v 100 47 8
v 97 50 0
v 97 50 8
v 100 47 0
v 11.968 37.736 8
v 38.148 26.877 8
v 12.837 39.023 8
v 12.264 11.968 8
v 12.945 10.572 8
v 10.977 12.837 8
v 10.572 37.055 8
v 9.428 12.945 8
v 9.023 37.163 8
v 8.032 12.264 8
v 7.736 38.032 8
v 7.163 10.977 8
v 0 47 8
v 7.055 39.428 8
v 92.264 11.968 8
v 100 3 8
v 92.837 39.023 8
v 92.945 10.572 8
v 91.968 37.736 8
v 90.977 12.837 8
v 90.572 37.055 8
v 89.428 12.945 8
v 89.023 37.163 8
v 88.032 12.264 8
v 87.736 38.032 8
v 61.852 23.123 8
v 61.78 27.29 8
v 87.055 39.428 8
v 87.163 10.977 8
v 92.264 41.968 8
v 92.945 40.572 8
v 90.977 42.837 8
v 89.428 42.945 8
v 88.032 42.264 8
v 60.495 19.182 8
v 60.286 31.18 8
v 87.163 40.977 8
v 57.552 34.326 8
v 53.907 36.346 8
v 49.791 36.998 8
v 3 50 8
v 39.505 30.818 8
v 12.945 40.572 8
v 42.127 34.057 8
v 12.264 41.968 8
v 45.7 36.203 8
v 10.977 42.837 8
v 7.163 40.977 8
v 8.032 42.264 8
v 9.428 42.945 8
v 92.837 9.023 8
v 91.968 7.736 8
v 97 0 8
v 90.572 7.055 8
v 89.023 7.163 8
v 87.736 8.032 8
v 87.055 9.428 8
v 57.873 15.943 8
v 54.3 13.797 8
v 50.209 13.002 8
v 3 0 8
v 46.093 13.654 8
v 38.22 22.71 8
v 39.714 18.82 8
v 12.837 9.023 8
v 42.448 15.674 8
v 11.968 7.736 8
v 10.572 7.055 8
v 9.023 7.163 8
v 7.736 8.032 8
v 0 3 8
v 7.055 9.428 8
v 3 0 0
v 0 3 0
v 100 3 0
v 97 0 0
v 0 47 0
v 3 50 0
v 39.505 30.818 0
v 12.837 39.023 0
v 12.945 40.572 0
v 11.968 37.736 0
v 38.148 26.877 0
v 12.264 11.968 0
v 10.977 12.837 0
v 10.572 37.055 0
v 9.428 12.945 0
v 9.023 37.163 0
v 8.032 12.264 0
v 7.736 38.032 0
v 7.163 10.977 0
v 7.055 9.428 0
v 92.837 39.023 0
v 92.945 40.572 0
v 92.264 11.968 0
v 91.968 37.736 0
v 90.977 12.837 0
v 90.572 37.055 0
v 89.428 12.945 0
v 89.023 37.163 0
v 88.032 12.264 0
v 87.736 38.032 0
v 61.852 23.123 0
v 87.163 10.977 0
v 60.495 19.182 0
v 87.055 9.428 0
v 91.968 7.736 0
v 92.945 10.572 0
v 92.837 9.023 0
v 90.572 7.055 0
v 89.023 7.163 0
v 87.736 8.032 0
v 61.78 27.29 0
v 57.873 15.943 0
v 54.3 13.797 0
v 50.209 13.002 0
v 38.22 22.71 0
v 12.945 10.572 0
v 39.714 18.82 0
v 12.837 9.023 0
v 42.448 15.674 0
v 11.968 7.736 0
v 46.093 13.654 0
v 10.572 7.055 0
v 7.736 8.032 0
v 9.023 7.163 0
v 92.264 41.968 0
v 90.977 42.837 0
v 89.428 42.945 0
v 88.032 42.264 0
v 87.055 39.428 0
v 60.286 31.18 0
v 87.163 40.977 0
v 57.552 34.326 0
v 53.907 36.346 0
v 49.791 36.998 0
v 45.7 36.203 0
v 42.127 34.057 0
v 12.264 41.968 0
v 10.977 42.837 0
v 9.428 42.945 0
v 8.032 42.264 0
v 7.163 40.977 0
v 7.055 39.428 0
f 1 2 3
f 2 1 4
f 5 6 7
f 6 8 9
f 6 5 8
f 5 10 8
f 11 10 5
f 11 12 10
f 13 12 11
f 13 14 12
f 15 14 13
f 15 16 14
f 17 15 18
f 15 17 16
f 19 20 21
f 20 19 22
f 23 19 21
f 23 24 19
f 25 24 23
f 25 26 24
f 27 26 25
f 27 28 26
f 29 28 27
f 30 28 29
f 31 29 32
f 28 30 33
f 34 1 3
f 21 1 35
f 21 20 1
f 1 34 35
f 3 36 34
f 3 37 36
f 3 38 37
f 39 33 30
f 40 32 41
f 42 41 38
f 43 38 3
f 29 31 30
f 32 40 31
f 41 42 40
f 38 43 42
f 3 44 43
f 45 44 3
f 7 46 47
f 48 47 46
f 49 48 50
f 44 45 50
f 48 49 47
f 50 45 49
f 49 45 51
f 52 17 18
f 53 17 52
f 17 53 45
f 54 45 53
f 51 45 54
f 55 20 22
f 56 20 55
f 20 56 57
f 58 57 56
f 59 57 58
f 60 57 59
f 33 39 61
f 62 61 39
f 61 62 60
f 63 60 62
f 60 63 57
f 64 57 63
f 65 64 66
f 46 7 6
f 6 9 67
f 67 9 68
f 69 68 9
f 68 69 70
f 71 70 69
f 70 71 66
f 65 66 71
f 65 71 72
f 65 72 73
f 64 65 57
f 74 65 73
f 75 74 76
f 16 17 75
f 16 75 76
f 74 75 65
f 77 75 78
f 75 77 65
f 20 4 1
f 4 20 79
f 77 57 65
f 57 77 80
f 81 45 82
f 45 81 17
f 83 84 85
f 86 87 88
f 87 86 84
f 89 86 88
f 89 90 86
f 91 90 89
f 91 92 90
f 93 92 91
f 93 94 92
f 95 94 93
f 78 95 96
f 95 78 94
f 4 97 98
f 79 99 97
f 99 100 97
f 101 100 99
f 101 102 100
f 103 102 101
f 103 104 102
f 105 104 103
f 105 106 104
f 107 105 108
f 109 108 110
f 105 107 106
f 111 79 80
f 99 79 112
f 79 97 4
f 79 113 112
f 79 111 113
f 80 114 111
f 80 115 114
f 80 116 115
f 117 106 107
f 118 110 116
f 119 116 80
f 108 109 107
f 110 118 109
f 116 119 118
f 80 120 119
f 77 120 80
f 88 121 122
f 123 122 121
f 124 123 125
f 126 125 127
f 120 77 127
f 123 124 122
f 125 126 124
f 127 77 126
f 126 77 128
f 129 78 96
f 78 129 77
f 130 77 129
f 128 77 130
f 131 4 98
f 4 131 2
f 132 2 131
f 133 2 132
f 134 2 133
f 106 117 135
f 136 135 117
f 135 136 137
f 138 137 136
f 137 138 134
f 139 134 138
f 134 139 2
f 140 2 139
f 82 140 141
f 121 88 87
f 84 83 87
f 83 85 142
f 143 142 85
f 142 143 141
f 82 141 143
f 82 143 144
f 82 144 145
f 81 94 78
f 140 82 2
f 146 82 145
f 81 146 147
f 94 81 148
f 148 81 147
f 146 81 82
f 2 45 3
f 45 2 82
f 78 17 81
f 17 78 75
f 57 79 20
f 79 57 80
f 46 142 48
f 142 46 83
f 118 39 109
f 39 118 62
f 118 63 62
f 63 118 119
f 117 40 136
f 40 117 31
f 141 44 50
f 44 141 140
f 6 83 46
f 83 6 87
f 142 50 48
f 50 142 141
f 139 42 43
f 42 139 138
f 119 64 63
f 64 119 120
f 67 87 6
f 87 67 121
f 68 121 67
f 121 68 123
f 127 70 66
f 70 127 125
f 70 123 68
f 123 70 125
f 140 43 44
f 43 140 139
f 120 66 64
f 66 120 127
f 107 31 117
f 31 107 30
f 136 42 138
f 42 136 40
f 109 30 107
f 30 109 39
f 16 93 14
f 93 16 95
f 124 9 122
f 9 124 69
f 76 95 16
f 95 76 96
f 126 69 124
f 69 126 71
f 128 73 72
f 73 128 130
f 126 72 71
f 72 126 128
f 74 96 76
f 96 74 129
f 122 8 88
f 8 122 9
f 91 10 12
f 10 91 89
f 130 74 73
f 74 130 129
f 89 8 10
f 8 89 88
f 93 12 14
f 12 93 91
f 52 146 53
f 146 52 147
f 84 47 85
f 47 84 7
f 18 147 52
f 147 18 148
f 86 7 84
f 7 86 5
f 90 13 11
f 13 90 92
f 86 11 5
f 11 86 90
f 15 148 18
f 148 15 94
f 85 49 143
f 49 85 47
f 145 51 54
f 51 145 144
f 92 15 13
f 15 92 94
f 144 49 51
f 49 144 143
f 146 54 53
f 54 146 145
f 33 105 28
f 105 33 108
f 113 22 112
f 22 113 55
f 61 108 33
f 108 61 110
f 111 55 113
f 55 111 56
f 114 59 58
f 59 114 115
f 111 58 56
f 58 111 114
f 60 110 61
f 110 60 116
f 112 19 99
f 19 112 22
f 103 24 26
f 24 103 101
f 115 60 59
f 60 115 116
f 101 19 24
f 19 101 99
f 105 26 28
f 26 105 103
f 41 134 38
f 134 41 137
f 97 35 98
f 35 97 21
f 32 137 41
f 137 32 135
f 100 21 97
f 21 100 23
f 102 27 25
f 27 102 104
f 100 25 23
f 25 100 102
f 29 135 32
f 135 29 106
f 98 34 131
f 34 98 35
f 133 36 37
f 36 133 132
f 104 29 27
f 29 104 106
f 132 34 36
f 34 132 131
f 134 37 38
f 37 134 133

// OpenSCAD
$fn = 32;

// ----------------------------------------------------------------------
// Spacer plate: rect 100 x 50
// ----------------------------------------------------------------------

// --- parameters (mm) ---
bore_r = 12;              // centre bore radius
bolt_r = 3;               // bolt hole radius
plate_t = 8;              // plate thickness, Z (extrusion height)
plate_l = 100;            // plate length, X
plate_w = 50;             // plate width, Y
inset = 10;               // corner hole inset

profile = [[3, 0], [97, 0], [100, 3], [100, 47], [97, 50], [3, 50], [0, 47], [0, 3]];  // primary outline, 8 points, counter clockwise
void_1 = [[61.78, 27.29], [60.286, 31.18], [57.552, 34.326], [53.907, 36.346], [49.791, 36.998], [45.7, 36.203], [42.127, 34.057], [39.505, 30.818], [38.148, 26.877], [38.22, 22.71], [39.714, 18.82], [42.448, 15.674], [46.093, 13.654], [50.209, 13.002], [54.3, 13.797], [57.873, 15.943], [60.495, 19.182], [61.852, 23.123]];  // centre bore, 18 points
void_2 = [[12.945, 10.572], [12.264, 11.968], [10.977, 12.837], [9.428, 12.945], [8.032, 12.264], [7.163, 10.977], [7.055, 9.428], [7.736, 8.032], [9.023, 7.163], [10.572, 7.055], [11.968, 7.736], [12.837, 9.023]];  // corner hole, 12 points
void_3 = [[12.945, 40.572], [12.264, 41.968], [10.977, 42.837], [9.428, 42.945], [8.032, 42.264], [7.163, 40.977], [7.055, 39.428], [7.736, 38.032], [9.023, 37.163], [10.572, 37.055], [11.968, 37.736], [12.837, 39.023]];  // corner hole, 12 points
void_4 = [[92.945, 10.572], [92.264, 11.968], [90.977, 12.837], [89.428, 12.945], [88.032, 12.264], [87.163, 10.977], [87.055, 9.428], [87.736, 8.032], [89.023, 7.163], [90.572, 7.055], [91.968, 7.736], [92.837, 9.023]];  // corner hole, 12 points
void_5 = [[92.945, 40.572], [92.264, 41.968], [90.977, 42.837], [89.428, 42.945], [88.032, 42.264], [87.163, 40.977], [87.055, 39.428], [87.736, 38.032], [89.023, 37.163], [90.572, 37.055], [91.968, 37.736], [92.837, 39.023]];  // corner hole, 12 points

// --- the one profile operation ---
difference() {
  linear_extrude(height = plate_t) polygon(points = profile);
  translate([0, 0, -1])
    linear_extrude(height = plate_t + 2) polygon(points = void_1);
  translate([0, 0, -1])
    linear_extrude(height = plate_t + 2) polygon(points = void_2);
  translate([0, 0, -1])
    linear_extrude(height = plate_t + 2) polygon(points = void_3);
  translate([0, 0, -1])
    linear_extrude(height = plate_t + 2) polygon(points = void_4);
  translate([0, 0, -1])
    linear_extrude(height = plate_t + 2) polygon(points = void_5);
}
